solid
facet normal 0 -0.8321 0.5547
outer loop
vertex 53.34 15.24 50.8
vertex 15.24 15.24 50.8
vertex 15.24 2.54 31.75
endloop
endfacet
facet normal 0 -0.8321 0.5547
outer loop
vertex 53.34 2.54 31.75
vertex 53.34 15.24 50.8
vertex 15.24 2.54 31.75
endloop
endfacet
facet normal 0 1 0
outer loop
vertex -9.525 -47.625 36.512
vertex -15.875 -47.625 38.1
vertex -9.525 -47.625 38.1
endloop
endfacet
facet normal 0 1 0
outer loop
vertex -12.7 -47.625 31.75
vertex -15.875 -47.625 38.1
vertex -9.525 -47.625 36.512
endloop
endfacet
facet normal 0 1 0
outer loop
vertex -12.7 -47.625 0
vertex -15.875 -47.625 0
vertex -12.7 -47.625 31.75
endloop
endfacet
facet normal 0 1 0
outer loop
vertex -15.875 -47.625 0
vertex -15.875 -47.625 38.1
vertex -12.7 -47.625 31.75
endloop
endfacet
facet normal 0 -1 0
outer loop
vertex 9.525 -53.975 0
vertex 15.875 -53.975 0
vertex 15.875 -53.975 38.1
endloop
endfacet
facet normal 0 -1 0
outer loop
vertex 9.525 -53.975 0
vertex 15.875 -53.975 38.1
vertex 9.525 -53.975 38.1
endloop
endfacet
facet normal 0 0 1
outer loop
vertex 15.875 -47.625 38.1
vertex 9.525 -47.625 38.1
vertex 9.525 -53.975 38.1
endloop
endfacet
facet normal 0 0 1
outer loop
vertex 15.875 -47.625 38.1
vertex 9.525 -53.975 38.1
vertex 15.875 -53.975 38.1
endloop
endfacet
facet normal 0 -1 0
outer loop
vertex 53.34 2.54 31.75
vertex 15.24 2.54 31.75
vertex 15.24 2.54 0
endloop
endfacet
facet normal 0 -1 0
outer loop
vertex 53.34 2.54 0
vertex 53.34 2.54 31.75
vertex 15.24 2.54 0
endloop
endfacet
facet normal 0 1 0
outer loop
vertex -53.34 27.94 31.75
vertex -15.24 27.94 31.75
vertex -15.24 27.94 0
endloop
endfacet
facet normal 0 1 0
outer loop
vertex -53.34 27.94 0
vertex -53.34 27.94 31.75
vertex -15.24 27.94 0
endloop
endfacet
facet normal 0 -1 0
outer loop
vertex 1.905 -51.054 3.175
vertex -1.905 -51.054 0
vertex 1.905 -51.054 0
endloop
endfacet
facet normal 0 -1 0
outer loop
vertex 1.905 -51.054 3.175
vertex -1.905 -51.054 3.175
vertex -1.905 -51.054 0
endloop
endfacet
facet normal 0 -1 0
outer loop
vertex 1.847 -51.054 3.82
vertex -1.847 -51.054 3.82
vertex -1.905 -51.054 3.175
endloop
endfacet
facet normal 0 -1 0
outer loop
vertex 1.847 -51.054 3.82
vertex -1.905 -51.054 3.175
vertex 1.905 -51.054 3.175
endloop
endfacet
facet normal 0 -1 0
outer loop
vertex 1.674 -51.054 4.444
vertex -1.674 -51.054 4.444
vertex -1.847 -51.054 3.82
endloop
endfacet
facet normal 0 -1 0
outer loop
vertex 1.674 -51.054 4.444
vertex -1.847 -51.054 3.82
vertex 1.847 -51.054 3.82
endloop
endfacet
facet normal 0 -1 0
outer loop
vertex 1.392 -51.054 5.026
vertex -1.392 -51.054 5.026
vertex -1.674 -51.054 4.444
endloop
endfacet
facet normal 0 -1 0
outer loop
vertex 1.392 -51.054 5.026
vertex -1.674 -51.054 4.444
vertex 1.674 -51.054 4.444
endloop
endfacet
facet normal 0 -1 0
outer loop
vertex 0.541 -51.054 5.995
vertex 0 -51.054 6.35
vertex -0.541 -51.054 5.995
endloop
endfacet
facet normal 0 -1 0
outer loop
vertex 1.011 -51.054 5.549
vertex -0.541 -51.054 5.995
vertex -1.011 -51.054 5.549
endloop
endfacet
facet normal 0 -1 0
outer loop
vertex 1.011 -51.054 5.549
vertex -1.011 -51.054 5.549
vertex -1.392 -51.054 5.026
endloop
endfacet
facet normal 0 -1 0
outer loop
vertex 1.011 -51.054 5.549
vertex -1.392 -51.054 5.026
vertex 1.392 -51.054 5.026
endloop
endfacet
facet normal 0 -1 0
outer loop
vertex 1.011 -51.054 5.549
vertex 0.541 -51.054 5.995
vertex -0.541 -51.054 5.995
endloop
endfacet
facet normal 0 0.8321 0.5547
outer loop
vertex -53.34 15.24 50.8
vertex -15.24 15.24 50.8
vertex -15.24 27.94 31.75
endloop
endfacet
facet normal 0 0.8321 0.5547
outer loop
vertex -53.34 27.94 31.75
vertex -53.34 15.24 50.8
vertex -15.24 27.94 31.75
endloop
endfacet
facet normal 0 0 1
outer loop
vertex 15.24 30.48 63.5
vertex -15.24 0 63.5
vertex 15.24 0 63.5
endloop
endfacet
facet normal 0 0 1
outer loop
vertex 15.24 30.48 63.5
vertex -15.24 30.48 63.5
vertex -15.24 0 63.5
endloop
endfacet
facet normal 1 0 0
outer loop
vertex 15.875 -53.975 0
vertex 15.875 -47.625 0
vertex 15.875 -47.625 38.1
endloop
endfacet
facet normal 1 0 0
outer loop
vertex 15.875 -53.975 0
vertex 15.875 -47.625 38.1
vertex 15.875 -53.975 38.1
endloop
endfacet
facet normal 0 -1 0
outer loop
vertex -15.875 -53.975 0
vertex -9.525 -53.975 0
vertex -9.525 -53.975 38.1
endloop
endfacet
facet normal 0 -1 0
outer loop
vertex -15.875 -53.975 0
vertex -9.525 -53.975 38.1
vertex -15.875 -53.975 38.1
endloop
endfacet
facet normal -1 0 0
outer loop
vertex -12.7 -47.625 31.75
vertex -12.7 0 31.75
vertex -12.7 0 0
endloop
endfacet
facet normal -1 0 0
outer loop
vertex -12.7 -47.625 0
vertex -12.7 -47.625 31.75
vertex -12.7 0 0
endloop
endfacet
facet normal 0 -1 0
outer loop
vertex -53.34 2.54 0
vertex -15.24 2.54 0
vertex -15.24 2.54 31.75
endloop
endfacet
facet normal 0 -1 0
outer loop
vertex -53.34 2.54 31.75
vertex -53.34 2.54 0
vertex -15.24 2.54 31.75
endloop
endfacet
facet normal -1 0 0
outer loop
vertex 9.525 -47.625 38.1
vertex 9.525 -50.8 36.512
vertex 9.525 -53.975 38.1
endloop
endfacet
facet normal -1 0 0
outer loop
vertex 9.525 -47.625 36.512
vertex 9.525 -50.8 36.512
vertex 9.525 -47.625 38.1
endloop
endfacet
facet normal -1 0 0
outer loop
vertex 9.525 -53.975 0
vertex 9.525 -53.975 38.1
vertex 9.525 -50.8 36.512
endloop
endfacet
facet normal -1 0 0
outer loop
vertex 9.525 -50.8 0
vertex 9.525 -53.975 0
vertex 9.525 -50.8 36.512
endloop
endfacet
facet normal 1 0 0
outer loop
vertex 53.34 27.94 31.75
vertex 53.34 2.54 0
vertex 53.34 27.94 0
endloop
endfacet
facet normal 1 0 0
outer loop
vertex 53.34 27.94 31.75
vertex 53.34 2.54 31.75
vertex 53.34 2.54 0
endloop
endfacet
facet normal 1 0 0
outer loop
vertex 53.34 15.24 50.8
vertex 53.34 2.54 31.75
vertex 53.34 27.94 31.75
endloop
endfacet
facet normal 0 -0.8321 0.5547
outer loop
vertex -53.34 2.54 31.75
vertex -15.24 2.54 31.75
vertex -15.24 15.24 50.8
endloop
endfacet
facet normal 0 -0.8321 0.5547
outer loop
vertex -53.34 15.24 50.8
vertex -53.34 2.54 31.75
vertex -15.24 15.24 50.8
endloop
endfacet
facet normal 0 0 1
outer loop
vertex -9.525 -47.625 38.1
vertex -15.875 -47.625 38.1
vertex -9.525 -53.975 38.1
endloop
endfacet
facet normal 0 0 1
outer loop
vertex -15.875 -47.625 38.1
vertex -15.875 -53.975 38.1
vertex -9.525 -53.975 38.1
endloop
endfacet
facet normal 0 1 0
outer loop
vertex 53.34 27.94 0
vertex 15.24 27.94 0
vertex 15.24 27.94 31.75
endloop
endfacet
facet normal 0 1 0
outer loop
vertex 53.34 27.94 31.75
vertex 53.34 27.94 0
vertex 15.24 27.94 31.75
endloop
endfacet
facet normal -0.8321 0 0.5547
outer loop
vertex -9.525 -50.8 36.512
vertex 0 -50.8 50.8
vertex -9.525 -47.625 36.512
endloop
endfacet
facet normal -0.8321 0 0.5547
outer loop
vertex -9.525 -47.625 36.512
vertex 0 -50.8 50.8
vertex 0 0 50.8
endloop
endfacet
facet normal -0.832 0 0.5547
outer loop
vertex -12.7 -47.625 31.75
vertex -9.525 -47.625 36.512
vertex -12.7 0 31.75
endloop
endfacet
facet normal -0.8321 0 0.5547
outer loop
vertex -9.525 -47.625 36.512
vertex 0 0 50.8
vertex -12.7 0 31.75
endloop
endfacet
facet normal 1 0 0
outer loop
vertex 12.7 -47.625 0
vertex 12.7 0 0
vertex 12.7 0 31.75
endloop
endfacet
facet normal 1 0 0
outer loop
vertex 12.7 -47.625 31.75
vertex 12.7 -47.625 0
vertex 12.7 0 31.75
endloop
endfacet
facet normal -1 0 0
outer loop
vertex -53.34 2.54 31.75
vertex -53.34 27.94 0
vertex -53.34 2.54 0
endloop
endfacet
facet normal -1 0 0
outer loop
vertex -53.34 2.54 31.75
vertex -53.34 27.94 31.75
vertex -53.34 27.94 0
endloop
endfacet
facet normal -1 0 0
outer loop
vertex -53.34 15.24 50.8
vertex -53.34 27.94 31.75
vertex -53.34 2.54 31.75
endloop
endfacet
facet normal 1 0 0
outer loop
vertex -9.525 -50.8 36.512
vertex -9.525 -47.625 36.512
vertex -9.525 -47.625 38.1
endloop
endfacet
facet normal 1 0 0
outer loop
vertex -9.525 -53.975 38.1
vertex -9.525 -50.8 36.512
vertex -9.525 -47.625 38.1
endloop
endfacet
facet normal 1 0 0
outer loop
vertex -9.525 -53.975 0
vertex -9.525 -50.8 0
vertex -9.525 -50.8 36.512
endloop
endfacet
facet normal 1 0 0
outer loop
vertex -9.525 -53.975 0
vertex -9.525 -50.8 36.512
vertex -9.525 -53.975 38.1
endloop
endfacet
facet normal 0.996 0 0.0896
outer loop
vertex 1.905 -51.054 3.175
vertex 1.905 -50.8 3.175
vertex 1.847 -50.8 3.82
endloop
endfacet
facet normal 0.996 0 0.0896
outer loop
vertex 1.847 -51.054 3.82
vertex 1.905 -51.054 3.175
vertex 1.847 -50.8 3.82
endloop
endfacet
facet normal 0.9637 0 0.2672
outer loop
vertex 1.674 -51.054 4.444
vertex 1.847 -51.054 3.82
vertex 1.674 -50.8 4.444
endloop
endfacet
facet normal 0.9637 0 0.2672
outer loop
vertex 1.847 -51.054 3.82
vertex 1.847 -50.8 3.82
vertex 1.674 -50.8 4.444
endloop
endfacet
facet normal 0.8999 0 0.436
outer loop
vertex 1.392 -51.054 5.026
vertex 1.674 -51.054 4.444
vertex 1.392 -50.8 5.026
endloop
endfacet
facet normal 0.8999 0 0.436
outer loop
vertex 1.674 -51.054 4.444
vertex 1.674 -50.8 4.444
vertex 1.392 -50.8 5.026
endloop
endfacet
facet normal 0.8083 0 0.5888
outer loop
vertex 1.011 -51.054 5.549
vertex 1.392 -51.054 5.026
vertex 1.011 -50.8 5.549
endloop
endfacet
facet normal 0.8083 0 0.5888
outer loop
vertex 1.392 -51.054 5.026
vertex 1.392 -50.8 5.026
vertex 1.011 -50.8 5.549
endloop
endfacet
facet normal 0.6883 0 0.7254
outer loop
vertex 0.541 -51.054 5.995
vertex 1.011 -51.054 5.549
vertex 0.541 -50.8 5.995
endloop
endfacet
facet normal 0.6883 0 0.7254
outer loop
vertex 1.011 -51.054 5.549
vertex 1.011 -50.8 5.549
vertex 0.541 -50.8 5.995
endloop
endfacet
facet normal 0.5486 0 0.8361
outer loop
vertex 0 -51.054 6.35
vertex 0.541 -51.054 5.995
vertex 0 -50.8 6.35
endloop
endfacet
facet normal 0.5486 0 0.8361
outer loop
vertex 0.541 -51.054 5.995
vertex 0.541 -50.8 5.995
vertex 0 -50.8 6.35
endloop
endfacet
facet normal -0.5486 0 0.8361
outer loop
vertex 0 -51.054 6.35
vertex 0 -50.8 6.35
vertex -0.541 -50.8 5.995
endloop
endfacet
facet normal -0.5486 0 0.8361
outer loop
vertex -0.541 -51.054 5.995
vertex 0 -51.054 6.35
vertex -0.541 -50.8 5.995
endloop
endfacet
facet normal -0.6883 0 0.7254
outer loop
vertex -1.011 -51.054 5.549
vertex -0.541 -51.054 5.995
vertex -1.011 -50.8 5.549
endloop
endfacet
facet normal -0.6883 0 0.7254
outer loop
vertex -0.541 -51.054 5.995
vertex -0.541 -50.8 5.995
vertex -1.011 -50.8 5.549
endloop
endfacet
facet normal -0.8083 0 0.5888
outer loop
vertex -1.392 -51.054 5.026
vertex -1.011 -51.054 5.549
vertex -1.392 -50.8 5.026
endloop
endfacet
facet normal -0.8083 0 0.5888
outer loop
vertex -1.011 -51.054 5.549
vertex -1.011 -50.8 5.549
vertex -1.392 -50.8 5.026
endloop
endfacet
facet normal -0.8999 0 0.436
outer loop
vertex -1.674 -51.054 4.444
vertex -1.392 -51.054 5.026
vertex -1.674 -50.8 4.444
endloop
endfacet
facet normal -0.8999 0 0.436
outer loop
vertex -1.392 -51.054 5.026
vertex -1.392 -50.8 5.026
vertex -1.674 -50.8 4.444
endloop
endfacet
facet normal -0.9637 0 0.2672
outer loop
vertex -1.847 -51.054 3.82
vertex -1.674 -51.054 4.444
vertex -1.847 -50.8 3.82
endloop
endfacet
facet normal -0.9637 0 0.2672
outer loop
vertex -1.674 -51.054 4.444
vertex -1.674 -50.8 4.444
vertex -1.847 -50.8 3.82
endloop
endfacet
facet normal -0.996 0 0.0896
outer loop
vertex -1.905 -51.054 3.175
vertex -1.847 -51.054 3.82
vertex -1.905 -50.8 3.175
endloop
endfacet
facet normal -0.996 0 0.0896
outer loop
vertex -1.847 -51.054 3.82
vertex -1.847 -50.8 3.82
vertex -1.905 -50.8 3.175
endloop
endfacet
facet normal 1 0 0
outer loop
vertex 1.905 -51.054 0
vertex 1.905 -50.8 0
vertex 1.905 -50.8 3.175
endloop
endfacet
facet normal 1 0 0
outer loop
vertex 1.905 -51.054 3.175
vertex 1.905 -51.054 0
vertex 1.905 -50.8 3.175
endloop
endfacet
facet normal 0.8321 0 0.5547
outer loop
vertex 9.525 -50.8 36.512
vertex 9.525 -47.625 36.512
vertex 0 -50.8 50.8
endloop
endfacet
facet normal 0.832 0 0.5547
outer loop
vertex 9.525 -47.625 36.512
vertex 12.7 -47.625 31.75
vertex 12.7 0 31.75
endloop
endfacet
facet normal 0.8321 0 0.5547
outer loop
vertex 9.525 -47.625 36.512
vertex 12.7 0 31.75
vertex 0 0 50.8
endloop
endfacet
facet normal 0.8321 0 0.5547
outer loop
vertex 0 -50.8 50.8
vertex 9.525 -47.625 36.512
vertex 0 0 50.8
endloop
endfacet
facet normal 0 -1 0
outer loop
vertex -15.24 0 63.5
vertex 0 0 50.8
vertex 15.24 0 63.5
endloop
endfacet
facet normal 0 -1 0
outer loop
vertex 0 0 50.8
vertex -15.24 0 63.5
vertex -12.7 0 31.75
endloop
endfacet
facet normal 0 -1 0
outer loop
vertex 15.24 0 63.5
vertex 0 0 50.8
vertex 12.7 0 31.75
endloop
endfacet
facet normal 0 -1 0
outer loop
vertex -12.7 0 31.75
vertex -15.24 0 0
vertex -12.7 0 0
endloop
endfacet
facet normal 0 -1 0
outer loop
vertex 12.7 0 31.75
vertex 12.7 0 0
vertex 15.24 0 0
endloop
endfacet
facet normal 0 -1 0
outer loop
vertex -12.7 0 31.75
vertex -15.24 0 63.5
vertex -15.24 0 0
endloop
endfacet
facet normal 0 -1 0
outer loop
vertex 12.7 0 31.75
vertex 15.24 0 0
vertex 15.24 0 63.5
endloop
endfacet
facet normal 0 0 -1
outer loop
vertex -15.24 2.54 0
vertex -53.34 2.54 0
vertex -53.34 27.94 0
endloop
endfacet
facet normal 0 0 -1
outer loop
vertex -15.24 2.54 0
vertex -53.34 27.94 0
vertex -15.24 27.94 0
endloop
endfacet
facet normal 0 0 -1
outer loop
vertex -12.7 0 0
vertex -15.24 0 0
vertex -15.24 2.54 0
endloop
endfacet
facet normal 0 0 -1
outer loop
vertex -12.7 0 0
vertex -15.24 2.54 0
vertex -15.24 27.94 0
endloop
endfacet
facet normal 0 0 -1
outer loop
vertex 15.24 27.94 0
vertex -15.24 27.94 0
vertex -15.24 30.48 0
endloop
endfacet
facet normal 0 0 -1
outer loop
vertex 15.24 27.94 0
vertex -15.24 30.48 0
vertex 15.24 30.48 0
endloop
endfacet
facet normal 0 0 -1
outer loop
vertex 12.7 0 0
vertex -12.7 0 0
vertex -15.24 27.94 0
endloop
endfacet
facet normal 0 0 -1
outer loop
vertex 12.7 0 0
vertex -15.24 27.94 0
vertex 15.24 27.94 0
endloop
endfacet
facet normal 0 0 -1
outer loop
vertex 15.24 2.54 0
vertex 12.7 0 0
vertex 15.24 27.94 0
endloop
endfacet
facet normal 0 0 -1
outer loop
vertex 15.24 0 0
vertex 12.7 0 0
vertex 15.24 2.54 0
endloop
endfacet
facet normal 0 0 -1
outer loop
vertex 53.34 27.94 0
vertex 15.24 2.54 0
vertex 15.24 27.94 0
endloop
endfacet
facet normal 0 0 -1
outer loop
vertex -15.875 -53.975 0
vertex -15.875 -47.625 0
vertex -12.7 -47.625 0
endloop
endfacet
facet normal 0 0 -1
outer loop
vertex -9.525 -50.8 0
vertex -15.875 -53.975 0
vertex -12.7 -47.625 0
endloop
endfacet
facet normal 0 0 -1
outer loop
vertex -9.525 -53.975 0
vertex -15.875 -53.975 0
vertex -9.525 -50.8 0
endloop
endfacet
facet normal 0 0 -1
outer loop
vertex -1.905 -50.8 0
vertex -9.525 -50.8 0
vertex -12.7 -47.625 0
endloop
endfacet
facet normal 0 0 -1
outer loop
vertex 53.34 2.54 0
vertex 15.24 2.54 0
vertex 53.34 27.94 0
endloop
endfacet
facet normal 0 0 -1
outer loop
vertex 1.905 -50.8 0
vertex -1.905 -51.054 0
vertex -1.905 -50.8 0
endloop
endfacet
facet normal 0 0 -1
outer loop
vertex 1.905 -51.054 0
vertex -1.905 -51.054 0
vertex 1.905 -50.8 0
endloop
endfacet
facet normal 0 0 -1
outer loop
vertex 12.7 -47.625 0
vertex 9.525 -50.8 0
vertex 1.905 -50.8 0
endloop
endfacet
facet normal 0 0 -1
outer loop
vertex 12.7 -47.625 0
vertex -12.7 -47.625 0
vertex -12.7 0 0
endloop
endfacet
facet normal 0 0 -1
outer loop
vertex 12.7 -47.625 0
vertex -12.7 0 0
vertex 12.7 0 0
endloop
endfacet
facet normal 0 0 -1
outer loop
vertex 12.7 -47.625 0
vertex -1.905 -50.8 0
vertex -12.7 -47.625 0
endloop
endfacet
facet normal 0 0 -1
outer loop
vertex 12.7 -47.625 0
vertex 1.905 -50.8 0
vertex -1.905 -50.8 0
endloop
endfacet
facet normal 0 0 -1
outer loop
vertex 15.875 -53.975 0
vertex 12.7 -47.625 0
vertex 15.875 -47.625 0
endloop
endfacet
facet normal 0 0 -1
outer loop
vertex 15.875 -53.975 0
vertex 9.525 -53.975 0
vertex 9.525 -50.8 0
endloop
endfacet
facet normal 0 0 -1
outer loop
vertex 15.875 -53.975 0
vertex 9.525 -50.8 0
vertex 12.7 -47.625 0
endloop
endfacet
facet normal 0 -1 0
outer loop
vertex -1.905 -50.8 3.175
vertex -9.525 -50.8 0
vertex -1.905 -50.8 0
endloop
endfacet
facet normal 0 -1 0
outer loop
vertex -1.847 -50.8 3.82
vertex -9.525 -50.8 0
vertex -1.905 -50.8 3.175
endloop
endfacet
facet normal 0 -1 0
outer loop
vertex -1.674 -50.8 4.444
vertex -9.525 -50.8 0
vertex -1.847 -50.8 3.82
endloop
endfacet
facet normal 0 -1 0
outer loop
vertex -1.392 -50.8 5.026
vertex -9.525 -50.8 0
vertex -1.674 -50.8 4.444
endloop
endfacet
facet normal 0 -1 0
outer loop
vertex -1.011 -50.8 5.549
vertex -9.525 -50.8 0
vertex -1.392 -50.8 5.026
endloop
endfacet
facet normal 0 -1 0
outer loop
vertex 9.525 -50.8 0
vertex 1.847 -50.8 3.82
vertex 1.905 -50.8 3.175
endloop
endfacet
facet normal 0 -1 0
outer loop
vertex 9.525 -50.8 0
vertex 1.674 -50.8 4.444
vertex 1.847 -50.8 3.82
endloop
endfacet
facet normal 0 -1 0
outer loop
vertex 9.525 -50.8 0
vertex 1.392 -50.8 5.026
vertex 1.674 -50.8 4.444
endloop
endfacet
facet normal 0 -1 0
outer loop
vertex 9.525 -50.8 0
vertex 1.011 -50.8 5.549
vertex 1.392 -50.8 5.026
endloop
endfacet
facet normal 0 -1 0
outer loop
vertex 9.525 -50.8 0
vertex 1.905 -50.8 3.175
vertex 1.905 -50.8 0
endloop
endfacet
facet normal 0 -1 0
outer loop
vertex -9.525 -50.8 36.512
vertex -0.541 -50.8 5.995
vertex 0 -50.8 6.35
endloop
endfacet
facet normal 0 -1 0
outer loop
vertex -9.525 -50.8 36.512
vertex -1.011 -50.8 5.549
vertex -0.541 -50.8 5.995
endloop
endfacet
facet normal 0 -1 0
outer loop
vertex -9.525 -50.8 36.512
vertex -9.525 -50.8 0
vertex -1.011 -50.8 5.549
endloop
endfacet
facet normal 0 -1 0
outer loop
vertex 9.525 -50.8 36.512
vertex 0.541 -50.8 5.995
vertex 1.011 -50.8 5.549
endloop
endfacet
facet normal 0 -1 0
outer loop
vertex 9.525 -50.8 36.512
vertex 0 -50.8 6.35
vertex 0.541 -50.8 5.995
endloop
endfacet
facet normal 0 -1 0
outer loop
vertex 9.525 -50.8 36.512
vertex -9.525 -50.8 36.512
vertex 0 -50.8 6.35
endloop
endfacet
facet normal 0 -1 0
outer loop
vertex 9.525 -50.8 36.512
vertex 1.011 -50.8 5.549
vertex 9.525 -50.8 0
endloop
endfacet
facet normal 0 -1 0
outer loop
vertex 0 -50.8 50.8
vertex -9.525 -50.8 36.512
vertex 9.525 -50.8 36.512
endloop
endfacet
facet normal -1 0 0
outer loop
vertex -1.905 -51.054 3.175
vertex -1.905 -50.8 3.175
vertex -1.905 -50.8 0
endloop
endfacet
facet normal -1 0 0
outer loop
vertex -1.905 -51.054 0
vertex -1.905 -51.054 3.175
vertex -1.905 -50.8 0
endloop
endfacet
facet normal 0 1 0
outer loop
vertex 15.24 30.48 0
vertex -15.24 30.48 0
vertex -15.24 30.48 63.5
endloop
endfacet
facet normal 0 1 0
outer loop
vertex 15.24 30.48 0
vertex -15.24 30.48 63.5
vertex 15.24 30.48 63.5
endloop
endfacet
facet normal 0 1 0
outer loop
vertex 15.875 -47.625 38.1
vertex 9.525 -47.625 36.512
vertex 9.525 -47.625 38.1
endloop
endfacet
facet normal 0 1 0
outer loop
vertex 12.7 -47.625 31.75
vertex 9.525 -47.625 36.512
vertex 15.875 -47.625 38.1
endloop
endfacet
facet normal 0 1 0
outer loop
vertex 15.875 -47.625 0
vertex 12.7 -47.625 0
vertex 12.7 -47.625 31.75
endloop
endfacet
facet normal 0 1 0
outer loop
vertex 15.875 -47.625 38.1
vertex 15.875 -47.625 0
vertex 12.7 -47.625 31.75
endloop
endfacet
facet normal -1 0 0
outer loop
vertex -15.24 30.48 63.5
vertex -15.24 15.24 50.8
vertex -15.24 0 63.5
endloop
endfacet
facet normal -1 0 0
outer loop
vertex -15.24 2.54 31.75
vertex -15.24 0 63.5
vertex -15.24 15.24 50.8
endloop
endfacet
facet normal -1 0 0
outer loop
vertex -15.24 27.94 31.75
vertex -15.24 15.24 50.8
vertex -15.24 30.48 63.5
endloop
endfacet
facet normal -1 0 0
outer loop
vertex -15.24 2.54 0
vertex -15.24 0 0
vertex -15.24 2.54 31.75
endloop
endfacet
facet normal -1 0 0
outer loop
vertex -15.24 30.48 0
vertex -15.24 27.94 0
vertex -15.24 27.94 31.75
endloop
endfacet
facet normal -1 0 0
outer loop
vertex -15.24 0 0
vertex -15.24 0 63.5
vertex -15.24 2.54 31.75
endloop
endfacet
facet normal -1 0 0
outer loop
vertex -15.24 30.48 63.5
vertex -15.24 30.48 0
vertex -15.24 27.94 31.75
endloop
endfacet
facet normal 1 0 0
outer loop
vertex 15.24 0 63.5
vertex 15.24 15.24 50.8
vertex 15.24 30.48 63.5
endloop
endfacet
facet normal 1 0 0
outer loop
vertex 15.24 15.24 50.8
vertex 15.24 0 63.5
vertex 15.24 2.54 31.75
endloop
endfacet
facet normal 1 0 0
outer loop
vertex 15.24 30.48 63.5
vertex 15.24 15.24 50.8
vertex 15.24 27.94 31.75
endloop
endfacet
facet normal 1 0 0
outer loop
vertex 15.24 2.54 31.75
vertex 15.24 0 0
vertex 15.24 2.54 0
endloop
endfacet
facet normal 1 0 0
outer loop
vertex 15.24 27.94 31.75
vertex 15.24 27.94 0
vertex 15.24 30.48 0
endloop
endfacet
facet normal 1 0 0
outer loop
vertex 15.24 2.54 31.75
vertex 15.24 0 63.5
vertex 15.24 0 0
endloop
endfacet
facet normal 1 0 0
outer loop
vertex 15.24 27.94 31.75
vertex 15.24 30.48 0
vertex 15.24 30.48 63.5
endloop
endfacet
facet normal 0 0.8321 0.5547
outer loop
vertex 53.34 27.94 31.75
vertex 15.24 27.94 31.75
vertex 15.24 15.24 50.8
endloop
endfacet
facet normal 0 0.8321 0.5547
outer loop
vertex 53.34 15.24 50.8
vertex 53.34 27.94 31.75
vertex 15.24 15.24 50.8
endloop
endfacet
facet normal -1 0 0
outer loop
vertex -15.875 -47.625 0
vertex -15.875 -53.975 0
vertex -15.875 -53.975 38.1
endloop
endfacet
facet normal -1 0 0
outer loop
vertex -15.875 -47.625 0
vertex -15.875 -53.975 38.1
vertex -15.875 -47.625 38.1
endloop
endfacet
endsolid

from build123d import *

# Parameters (mm, degrees)
F1_DEPTH  = 50.8
F2_W      = 15.24
F2_H      = 30.48
F3_DEPTH  = 63.5
F4_W      = 15.24
F4_H      = 30.48
F5_DEPTH  = 63.5
F7_DEPTH  = 38.1
F9_DEPTH  = 38.1
F11_DEPTH = 38.1
F10_W     = 3.175
F10_H     = 3.175
F12_DEPTH = 38.1
F15_DEPTH = 0.254


with BuildPart() as f1:
    # F0 (on Front) → F1 (new body)
    with BuildSketch(Plane.XZ):
        Polygon((-12.7, 0), (0, 0), (12.7, 0), (12.7, 31.75), (0, 50.8), (-12.7, 31.75), align=None)
    extrude(amount=F1_DEPTH)

    # F2 (on Top) → F3 (join)
    with BuildSketch(Plane.XY):
        with Locations((-7.62, 15.24)):
            Rectangle(F2_W, F2_H)
    extrude(amount=F3_DEPTH)

    # F4 (on Top) → F5 (join)
    with BuildSketch(Plane.XY):
        with Locations((7.62, 15.24)):
            Rectangle(F4_W, F4_H)
    extrude(amount=F5_DEPTH)

    # F6 (on face) → F7 (join)
    with BuildSketch(Plane.YZ.offset(15.24)):
        Polygon((2.54, 0), (15.24, 0), (27.94, 0), (27.94, 31.75), (15.24, 50.8), (2.54, 31.75), align=None)
    extrude(amount=F7_DEPTH)

    # F8 (on face) → F9 (join)
    with BuildSketch(Plane(origin=(-15.24, 0, 0), x_dir=(0, -1, 0), z_dir=(-1, 0, 0))):
        Polygon((-27.94, 0), (-15.24, 0), (-2.54, 0), (-2.54, 31.75), (-15.24, 50.8), (-27.94, 31.75), align=None)
    extrude(amount=F9_DEPTH)

    # F10 (on face) → F11 (join)
    with BuildSketch(Plane(origin=(0, 0, 0), x_dir=(1, 0, 0), z_dir=(0, 0, -1))):
        Polygon((9.525, 50.8), (12.7, 50.8), (15.875, 50.8), (15.875, 53.975), (9.525, 53.975), align=None)
    extrude(amount=-F11_DEPTH)

    # F10 (on face) → F12 (join)
    with BuildSketch(Plane(origin=(0, 0, 0), x_dir=(1, 0, 0), z_dir=(0, 0, -1))):
        Polygon((9.525, 50.8), (12.7, 50.8), (15.875, 50.8), (15.875, 53.975), (9.525, 53.975), align=None)
        with Locations((14.2875, 49.2125)):
            Rectangle(F10_W, F10_H)
        with Locations((11.1125, 49.2125)):
            Rectangle(F10_W, F10_H)
        with Locations((-14.2875, 49.2125)):
            Rectangle(F10_W, F10_H)
        with Locations((-11.1125, 49.2125)):
            Rectangle(F10_W, F10_H)
        Polygon((-15.875, 50.8), (-12.7, 50.8), (-9.525, 50.8), (-9.525, 53.975), (-15.875, 53.975), align=None)
    extrude(amount=-F12_DEPTH)

    # F13 (on face) → F15 (join)
    with BuildSketch(Plane.XZ.offset(50.8)):
        with BuildLine():
            Line((-1.905, 0), (0, 0))
            Line((0, 0), (0, 6.35))
            ThreePointArc((0, 6.35), (-1.392212, 5.026327), (-1.905, 3.175))
            Line((-1.905, 3.175), (-1.905, 0))
        make_face()
        with BuildLine():
            Line((0, 6.35), (0, 0))
            Line((0, 0), (1.905, 0))
            Line((1.905, 0), (1.905, 3.175))
            ThreePointArc((1.905, 3.175), (1.392212, 5.026327), (0, 6.35))
        make_face()
    extrude(amount=F15_DEPTH)


solid = f1.part
